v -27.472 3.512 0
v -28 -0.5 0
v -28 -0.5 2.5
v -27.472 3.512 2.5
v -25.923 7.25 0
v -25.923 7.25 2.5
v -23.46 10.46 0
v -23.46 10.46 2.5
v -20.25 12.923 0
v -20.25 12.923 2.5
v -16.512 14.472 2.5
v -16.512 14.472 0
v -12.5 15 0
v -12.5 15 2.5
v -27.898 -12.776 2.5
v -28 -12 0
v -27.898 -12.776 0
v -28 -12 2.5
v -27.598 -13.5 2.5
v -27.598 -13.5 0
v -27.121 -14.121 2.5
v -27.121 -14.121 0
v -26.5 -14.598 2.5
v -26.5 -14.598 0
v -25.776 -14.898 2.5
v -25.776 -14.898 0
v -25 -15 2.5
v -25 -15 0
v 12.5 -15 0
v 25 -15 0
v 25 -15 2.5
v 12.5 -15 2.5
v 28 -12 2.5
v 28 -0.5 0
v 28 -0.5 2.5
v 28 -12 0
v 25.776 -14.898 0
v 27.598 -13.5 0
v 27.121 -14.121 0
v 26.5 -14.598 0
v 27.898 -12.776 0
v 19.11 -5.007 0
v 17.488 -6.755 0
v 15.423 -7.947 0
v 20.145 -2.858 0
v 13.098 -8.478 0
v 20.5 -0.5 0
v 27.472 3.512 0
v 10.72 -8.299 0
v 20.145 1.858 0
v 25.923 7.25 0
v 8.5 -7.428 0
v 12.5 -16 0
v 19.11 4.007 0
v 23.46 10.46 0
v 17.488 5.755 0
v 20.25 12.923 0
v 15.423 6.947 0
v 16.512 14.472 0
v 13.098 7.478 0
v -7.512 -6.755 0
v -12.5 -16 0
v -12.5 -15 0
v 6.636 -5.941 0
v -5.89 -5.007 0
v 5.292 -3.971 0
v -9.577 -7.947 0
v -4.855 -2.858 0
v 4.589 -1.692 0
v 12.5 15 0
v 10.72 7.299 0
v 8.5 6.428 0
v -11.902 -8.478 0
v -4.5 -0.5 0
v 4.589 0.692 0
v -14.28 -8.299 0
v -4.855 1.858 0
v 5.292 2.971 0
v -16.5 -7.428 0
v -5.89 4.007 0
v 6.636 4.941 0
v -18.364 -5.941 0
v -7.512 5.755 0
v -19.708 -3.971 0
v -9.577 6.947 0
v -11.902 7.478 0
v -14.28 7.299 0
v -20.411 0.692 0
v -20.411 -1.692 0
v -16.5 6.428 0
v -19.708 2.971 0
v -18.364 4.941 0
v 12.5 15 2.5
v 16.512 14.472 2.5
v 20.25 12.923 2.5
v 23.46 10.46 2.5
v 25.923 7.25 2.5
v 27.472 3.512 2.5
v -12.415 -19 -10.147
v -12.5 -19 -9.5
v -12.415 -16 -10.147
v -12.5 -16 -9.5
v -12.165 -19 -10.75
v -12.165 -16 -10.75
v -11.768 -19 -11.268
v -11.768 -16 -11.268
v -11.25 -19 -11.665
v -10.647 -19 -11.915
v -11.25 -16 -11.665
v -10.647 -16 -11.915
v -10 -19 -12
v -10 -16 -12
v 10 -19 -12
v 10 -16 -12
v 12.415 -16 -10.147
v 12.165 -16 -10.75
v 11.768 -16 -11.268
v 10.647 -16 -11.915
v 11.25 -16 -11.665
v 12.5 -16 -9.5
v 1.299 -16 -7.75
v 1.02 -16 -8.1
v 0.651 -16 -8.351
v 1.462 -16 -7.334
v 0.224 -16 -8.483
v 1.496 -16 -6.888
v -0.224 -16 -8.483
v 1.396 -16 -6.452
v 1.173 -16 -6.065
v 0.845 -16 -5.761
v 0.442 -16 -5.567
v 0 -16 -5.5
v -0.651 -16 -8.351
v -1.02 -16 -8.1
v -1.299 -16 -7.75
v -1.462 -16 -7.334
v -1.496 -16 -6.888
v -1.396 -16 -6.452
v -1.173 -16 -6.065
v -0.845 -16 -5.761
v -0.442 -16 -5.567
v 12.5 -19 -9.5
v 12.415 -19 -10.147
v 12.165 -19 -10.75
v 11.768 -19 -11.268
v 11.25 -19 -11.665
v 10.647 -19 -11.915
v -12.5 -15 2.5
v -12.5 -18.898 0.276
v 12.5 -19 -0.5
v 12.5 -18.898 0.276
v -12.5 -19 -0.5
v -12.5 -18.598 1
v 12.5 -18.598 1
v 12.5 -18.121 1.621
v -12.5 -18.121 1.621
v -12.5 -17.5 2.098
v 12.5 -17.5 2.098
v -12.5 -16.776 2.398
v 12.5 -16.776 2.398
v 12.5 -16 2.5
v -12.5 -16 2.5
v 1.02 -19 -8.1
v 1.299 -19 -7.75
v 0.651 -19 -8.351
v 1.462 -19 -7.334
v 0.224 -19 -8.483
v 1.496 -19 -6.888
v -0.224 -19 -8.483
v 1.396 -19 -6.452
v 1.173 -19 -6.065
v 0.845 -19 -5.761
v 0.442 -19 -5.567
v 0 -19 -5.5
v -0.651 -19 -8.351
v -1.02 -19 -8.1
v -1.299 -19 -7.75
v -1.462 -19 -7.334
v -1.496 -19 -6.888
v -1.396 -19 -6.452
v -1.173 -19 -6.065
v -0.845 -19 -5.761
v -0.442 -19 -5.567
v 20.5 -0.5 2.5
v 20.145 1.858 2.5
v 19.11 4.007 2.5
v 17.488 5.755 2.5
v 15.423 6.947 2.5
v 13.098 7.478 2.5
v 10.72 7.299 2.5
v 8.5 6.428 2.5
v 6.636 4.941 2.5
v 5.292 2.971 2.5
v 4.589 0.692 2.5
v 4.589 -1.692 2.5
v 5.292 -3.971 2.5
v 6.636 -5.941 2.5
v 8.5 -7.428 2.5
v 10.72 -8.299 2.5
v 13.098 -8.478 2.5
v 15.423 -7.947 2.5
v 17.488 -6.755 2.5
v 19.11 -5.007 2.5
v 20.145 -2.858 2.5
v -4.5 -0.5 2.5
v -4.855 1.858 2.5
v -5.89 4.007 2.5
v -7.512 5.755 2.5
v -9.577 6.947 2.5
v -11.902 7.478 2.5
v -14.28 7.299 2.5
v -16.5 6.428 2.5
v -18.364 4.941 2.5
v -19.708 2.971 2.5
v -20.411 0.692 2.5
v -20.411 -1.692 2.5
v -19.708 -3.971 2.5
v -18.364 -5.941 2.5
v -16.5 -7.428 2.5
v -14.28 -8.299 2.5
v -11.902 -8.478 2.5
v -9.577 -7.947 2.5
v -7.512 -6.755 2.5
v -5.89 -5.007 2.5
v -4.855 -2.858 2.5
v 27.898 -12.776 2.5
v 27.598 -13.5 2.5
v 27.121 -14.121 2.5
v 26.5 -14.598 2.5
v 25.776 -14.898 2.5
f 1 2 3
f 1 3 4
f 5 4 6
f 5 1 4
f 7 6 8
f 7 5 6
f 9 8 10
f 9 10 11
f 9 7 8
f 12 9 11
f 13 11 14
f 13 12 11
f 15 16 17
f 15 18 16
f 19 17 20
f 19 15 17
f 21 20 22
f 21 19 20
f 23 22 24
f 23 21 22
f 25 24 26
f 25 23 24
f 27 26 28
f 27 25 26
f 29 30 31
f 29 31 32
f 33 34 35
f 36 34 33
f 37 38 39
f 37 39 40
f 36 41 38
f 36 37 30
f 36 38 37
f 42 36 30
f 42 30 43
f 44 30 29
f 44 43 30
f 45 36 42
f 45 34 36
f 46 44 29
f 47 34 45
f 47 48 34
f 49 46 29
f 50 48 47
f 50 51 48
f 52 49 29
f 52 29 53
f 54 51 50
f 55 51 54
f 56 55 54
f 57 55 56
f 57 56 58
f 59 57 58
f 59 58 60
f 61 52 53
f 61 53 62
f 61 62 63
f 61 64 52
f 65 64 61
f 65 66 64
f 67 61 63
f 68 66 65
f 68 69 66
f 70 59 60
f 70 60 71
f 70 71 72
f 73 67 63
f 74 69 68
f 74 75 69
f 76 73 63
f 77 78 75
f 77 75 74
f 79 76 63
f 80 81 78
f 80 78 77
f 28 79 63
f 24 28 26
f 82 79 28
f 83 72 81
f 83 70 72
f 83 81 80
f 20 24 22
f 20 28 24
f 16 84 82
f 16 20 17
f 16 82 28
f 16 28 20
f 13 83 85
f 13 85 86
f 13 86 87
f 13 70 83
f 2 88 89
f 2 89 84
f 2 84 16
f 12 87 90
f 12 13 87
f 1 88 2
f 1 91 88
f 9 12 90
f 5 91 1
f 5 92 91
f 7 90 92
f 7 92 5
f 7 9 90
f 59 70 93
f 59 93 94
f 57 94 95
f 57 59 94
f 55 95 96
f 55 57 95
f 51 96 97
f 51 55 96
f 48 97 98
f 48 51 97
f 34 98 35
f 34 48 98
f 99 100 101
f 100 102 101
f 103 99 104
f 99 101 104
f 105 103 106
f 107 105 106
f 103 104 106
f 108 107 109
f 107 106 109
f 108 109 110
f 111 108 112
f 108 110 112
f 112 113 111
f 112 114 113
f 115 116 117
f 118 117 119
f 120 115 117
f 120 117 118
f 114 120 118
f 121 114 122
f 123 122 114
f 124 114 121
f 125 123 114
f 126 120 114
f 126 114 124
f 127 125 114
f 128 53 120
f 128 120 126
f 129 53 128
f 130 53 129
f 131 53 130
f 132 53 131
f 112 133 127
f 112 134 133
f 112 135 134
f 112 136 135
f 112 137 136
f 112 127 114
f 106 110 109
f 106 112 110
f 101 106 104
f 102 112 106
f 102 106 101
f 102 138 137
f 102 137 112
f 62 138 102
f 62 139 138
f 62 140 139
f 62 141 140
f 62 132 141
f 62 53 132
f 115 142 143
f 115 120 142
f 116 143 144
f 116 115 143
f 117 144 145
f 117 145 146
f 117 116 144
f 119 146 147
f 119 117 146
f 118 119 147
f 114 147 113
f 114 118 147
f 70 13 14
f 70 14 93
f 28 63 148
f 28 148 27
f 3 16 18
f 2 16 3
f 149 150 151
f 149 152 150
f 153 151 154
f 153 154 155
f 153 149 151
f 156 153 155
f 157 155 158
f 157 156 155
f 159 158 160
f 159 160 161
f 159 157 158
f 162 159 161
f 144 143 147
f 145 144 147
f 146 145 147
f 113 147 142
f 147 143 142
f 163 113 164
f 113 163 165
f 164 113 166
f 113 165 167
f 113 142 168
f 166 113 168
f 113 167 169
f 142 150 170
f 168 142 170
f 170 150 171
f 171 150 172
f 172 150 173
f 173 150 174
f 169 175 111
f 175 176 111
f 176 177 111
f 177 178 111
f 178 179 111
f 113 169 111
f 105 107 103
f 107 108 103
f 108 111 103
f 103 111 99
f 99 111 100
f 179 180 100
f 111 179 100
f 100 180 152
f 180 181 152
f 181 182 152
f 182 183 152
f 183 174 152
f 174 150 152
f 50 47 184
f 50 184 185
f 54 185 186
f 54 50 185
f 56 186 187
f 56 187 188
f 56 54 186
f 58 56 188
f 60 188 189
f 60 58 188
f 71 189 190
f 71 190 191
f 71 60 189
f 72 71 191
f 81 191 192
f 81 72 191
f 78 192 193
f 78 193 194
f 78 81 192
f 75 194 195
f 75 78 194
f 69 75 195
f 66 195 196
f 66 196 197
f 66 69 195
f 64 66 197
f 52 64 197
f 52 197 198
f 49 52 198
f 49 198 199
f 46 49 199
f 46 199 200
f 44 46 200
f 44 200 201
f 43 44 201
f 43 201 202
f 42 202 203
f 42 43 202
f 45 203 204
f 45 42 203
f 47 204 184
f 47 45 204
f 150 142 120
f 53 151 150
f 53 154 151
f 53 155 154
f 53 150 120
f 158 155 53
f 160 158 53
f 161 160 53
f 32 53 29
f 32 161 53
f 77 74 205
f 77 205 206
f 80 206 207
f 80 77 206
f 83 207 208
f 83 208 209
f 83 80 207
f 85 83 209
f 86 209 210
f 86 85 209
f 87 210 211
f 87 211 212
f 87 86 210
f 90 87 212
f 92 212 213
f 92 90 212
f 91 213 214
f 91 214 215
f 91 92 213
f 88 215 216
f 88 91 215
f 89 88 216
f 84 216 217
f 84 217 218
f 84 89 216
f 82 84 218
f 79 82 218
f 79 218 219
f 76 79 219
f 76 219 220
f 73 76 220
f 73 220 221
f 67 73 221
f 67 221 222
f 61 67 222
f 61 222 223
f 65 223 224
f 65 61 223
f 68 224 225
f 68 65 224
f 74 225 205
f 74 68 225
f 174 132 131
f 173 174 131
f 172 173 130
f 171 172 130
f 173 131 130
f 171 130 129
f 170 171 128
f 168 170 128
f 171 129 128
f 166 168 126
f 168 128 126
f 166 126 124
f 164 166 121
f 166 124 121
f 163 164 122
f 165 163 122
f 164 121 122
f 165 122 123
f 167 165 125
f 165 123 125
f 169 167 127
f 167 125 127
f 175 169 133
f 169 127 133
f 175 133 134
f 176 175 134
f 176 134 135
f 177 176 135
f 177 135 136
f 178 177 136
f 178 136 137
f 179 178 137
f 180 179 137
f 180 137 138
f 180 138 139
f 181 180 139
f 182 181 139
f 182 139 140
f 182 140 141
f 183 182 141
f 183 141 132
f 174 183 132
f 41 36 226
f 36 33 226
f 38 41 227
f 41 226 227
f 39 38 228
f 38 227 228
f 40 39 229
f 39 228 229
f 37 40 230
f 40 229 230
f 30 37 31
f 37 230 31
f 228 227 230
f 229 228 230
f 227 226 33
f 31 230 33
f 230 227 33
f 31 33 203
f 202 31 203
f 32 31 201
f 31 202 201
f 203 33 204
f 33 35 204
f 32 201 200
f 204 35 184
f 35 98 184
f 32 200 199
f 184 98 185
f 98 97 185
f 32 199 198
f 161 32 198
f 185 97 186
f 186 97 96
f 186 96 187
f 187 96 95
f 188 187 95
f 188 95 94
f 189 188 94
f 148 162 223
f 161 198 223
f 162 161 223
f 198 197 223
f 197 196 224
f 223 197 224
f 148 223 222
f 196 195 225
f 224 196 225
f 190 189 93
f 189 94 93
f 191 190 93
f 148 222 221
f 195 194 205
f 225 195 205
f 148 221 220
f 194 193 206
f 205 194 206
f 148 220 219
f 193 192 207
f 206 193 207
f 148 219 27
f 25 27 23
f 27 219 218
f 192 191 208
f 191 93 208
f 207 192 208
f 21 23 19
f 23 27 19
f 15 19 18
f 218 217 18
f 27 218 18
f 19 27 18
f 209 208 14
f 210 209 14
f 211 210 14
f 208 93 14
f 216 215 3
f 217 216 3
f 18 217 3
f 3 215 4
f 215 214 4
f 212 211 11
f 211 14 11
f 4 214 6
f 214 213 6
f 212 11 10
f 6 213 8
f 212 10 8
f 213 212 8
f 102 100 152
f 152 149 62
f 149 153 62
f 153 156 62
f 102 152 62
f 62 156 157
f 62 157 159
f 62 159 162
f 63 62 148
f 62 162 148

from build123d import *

# Parameters (mm, degrees)
SKETCH1_R           = 8
BOSS_EXTRUDE1_DEPTH = 2.5
FILLET1_R           = 3
SKETCH2_W           = 25
SKETCH2_H           = 3
BOSS_EXTRUDE2_DEPTH = 12
FILLET2_R           = 2.5
FILLET3_R           = 3
SKETCH3_R           = 1.5
CUT_EXTRUDE1_DEPTH  = 44.462627624


with BuildPart() as part:
    # Sketch1 → Boss-Extrude1 (new body)
    with BuildSketch(Plane.XY):
        with BuildLine():
            Line((-28, -15), (-28, -0.5))
            ThreePointArc((-28, -0.5), (-23.460155108, 10.460155108), (-12.5, 15))
            Line((-12.5, 15), (12.5, 15))
            ThreePointArc((12.5, 15), (23.460155108, 10.460155108), (28, -0.5))
            Line((28, -0.5), (28, -15))
            Line((28, -15), (12.5, -15))
            Line((12.5, -15), (12.5, -19))
            Line((12.5, -19), (-12.5, -19))
            Line((-12.5, -19), (-12.5, -15))
            Line((-12.5, -15), (-28, -15))
        make_face()
        with Locations((12.5, -0.5)):
            Circle(SKETCH1_R, mode=Mode.SUBTRACT)
        with Locations((-12.5, -0.5)):
            Circle(SKETCH1_R, mode=Mode.SUBTRACT)
    extrude(amount=BOSS_EXTRUDE1_DEPTH)

    # Fillet1
    fillet1_edges = [part.edges().sort_by_distance(p)[0] for p in [
        (-28, -15, 1.25),
        (28, -15, 1.25),
    ]]
    fillet(fillet1_edges, radius=FILLET1_R)

    # Sketch2 → Boss-Extrude2 (add)
    with BuildSketch(Plane(origin=(0, 0, 0), x_dir=(-1, 0, 0), z_dir=(0, 0, -1))):
        with Locations((0, -17.5)):
            Rectangle(SKETCH2_W, SKETCH2_H)
    extrude(amount=BOSS_EXTRUDE2_DEPTH)

    # Fillet2
    fillet2_edges = [part.edges().sort_by_distance(p)[0] for p in [
        (12.5, -17.5, -12),
        (-12.5, -17.5, -12),
    ]]
    fillet(fillet2_edges, radius=FILLET2_R)

    # Fillet3
    fillet3_edges = [part.edges().sort_by_distance(p)[0] for p in [
        (0, -19, 2.5),
    ]]
    fillet(fillet3_edges, radius=FILLET3_R)

    # Sketch3 → Cut-Extrude1 (cut, through all)
    with BuildSketch(Plane(origin=(0, -16, 0), x_dir=(1, 0, 0), z_dir=(0, 1, 0))):
        with Locations(Location((0, 7, 0), (0, 0, 270))):
            Circle(SKETCH3_R)
    extrude(amount=-CUT_EXTRUDE1_DEPTH, mode=Mode.SUBTRACT)


solid = part.part
